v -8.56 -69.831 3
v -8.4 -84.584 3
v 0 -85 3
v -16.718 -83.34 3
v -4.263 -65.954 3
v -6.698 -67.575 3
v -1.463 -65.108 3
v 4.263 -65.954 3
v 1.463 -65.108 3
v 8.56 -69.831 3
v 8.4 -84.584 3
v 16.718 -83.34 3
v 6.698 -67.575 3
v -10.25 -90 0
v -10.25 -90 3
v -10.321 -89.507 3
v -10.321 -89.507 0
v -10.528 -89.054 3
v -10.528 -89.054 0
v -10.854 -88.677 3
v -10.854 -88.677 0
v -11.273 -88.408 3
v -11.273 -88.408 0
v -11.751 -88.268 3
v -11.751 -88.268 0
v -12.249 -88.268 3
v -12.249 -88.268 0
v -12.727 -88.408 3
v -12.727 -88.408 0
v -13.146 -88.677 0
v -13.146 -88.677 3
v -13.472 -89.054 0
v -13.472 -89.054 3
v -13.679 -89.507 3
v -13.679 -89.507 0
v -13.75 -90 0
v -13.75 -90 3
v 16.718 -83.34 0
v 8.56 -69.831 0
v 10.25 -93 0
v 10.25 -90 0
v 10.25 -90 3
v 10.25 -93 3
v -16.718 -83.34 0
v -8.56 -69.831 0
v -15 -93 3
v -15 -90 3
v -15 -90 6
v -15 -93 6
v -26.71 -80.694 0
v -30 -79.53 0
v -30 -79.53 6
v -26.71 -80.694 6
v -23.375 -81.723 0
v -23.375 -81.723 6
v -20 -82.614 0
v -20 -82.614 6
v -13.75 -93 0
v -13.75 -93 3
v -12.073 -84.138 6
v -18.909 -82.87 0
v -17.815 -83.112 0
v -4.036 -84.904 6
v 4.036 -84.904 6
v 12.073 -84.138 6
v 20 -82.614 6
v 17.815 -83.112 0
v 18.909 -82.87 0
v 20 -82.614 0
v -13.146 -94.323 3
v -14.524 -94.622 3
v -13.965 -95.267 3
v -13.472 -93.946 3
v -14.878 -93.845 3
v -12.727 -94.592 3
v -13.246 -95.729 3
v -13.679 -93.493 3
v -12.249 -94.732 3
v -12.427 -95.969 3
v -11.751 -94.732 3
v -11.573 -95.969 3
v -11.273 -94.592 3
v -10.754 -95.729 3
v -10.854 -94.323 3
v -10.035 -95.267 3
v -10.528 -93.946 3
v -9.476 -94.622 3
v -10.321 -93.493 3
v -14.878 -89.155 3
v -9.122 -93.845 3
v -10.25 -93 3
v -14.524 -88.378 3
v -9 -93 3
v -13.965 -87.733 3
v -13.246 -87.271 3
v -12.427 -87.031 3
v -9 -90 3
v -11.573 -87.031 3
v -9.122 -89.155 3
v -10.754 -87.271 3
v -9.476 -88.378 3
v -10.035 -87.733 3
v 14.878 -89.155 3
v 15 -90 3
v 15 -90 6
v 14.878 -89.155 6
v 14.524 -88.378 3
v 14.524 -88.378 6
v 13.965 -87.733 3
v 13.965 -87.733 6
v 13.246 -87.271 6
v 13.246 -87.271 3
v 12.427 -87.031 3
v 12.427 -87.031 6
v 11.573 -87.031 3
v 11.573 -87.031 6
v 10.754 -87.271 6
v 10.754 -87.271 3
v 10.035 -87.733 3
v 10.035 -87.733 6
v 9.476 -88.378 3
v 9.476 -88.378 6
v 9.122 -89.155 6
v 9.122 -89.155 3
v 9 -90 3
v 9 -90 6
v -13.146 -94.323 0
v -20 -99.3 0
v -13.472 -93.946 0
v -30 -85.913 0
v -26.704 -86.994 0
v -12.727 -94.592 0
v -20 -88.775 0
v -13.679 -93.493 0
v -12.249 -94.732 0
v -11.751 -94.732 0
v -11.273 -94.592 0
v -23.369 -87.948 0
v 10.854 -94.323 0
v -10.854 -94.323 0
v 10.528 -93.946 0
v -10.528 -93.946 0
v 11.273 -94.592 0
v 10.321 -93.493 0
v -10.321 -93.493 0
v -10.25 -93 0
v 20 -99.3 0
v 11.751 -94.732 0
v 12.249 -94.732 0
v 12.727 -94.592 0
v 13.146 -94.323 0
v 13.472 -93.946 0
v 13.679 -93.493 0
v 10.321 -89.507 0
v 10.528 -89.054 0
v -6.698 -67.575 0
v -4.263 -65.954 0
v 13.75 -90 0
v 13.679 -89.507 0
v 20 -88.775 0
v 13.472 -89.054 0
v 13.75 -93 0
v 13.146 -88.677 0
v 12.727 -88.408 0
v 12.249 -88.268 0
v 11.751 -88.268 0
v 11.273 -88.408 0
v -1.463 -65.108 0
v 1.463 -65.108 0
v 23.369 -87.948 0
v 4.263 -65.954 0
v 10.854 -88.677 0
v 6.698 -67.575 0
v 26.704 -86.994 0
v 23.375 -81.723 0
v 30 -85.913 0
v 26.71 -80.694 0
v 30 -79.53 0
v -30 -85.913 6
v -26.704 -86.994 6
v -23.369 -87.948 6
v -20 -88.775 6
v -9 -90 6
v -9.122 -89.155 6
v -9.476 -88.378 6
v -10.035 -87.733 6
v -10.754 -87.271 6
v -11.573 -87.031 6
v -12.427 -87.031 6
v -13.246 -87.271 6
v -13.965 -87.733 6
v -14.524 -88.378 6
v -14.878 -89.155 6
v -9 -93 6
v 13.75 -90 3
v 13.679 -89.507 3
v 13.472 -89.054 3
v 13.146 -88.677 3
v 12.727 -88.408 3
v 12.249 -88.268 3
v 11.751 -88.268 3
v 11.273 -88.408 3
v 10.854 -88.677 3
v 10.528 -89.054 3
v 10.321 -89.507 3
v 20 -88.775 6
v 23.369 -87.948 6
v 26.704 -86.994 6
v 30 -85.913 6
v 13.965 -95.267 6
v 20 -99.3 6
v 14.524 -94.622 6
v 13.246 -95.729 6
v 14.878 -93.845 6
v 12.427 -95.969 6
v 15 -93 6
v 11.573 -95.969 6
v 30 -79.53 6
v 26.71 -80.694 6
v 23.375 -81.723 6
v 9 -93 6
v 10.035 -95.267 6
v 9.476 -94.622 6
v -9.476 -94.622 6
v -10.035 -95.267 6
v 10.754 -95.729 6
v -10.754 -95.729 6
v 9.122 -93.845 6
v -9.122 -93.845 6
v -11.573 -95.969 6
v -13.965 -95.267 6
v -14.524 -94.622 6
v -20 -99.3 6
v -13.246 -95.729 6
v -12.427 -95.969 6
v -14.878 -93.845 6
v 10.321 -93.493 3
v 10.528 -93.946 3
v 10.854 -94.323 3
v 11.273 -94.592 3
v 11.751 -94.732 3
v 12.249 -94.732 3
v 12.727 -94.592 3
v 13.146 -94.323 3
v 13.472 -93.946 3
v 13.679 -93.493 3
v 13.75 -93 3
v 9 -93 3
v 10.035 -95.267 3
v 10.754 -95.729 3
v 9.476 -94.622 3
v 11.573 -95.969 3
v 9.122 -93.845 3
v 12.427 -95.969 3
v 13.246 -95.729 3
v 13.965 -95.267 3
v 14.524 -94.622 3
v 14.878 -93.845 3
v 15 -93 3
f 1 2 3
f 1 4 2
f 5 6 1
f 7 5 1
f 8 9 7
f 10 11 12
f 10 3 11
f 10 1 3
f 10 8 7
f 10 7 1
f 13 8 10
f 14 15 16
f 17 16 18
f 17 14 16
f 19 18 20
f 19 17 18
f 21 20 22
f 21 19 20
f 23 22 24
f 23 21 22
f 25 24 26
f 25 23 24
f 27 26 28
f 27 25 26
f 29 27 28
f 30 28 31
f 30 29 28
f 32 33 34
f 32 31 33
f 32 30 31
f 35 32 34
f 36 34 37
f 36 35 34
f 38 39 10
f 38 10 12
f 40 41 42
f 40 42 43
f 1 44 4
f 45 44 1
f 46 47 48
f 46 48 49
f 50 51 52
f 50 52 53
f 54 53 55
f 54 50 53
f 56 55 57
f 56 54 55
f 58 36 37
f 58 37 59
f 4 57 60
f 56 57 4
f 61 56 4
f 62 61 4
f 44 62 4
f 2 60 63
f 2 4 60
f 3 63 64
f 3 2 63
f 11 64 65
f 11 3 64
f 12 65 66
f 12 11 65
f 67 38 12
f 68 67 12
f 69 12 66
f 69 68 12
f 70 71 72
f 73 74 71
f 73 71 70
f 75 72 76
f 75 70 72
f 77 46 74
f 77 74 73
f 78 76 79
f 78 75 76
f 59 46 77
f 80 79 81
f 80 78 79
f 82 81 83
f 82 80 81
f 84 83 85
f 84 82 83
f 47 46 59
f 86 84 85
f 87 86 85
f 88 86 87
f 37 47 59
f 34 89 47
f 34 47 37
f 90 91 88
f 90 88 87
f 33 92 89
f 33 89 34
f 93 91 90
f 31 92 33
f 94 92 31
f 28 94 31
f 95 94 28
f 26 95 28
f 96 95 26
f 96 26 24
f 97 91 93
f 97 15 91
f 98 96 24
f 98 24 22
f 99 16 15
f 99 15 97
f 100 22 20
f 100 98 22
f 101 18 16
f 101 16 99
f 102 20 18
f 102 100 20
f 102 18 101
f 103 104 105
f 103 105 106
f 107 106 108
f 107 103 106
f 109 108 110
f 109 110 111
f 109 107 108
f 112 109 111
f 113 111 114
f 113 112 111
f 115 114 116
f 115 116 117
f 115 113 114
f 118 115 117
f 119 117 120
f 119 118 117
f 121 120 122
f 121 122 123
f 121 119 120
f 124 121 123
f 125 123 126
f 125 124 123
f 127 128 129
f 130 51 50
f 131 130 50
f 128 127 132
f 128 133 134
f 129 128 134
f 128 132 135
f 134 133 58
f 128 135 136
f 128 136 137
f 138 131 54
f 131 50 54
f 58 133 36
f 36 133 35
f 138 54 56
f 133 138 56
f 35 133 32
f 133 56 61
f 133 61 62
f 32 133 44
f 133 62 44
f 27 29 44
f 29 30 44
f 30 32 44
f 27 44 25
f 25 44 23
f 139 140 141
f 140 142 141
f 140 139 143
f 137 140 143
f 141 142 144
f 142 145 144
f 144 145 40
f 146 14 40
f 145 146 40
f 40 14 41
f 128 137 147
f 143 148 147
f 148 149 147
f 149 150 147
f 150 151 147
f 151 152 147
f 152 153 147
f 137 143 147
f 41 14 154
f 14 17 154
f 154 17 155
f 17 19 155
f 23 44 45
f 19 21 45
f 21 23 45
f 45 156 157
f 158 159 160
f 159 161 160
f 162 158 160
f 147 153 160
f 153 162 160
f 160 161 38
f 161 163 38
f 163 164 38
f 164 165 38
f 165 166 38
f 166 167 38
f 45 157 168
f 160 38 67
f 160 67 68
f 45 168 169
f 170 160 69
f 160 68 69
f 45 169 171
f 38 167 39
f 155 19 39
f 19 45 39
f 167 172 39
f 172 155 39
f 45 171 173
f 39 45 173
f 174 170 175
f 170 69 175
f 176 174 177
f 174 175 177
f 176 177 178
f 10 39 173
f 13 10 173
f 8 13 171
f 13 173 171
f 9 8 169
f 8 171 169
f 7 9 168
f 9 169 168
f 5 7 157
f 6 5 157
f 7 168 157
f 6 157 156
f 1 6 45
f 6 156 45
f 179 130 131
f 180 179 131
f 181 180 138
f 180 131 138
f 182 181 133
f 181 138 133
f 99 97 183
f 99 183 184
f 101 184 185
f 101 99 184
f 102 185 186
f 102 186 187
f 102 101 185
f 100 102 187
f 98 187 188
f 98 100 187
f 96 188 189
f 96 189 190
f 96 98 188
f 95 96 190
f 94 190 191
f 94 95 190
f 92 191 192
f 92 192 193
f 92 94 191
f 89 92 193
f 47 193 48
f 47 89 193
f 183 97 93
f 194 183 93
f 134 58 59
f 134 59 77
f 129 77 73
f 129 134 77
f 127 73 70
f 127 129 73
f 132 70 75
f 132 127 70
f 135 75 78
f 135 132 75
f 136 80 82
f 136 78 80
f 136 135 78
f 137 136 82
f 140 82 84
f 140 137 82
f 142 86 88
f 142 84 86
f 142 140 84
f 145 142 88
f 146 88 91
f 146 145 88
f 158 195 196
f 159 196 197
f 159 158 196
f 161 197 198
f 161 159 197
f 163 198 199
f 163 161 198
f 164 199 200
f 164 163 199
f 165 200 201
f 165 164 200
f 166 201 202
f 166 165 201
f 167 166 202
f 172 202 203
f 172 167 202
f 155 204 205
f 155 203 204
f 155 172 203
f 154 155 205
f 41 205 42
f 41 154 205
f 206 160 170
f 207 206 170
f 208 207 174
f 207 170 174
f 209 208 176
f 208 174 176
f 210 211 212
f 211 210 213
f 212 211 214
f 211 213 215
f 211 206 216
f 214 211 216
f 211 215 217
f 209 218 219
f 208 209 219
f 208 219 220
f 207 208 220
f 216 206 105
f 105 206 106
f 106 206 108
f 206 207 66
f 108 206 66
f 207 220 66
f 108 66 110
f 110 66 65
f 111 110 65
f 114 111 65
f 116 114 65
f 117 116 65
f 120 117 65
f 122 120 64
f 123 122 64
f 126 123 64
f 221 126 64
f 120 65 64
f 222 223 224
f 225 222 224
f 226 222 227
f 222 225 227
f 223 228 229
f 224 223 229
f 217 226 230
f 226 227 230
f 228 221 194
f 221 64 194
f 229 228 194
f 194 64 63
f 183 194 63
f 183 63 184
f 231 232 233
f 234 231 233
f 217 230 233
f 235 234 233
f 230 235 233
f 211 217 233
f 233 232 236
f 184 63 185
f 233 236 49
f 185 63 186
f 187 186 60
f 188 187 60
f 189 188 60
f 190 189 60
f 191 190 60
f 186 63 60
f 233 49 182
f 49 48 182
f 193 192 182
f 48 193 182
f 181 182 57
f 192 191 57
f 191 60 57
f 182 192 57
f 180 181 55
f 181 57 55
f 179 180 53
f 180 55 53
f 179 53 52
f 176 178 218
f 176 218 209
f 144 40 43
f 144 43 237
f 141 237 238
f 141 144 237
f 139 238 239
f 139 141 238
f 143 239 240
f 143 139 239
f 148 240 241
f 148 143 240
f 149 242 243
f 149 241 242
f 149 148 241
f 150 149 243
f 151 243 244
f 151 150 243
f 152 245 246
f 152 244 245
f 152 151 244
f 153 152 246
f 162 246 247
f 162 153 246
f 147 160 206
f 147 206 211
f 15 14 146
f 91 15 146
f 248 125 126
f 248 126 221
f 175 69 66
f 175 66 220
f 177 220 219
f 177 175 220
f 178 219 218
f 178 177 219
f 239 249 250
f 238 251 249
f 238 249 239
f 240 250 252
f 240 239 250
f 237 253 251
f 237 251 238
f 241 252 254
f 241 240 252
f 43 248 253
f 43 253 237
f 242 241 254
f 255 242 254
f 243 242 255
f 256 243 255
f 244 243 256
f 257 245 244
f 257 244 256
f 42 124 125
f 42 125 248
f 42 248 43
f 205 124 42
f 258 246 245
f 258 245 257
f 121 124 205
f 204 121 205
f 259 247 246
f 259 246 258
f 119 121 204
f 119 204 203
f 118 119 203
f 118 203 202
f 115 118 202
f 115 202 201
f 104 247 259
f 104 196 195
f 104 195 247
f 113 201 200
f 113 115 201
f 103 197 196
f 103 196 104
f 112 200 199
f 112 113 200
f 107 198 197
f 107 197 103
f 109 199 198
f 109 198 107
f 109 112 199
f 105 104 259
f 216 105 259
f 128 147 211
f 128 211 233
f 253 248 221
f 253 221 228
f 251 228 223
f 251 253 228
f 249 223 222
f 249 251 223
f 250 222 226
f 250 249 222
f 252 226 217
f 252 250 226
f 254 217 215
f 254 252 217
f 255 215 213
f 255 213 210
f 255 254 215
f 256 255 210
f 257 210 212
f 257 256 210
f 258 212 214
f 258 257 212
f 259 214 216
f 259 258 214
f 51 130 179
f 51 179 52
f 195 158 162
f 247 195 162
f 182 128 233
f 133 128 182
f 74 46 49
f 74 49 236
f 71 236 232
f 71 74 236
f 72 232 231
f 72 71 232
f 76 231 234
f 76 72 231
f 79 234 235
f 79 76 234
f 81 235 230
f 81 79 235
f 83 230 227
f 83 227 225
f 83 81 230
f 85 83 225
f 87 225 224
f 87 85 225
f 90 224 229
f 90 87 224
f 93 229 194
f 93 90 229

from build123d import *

# Parameters (mm, degrees)
PAD004_DEPTH = 3
PAD_DEPTH    = 6
PAD002_DEPTH = 6
PAD003_DEPTH = 3
PAD001_DEPTH = 6


with BuildPart() as counterborehole_pad:
    # Sketch004 → Pad004 (new body)
    with BuildSketch(Plane.XY.offset(3)):
        with BuildLine():
            ThreePointArc((-15, -93.000008), (-11.999996, -96), (-9, -93))
            Line((-9, -90), (-9, -93))
            ThreePointArc((-9, -90), (-12, -87), (-15, -90.000001))
            Line((-15, -90.000001), (-15, -93.000008))
        make_face()
        with BuildLine():
            ThreePointArc((15, -90.000001), (12, -87), (9, -90))
            Line((9, -90), (9, -93))
            ThreePointArc((9, -93), (11.999996, -96), (15, -93.000008))
            Line((15, -90.000001), (15, -93.000008))
        make_face()
    extrude(amount=PAD004_DEPTH)


with BuildPart() as throughhole_pad:
    # Sketch003 → Pad (new body)
    with BuildSketch(Plane.XY):
        with BuildLine():
            ThreePointArc((-10.25, -90), (-12.000001, -88.25), (-13.75, -90.000003))
            Line((-13.75, -90.000003), (-13.75, -93))
            ThreePointArc((-13.75, -93), (-12, -94.75), (-10.25, -93))
            Line((-10.25, -90), (-10.25, -93))
        make_face()
        with BuildLine():
            ThreePointArc((13.75, -90.000003), (12.000001, -88.25), (10.25, -90))
            Line((10.25, -90), (10.25, -93))
            ThreePointArc((10.25, -93), (12, -94.75), (13.75, -93))
            Line((13.75, -90.000003), (13.75, -93))
        make_face()
    extrude(amount=PAD_DEPTH)


with BuildPart() as frame_pad:
    # Sketch002 → Pad002 (new body)
    with BuildSketch(Plane.XY):
        with BuildLine():
            ThreePointArc((-30, -79.529869), (0, -85), (30, -79.529869))
            Line((30, -79.529869), (30, -85.912746))
            ThreePointArc((-30, -85.912746), (0, -91), (30, -85.912746))
            Line((-30, -85.912746), (-30, -79.529869))
        make_face()
    extrude(amount=PAD002_DEPTH)


with BuildPart() as base_pad:
    # Sketch001 → Pad003 (new body)
    with BuildSketch(Plane.XY):
        with BuildLine():
            ThreePointArc((8.560325, -69.83078), (0, -65), (-8.560325, -69.83078))
            Line((-20, -88.774996), (-8.560325, -69.83078))
            ThreePointArc((-20, -88.774996), (0, -91), (20, -88.774996))
            Line((8.560325, -69.83078), (20, -88.774996))
        make_face()
    extrude(amount=PAD003_DEPTH)


with BuildPart() as counterborehole_cut:
    # Sketch → Pad001 (new body)
    with BuildSketch(Plane.XY):
        with BuildLine():
            ThreePointArc((-20, -82.613558), (0, -85), (20, -82.613558))
            Line((20, -82.613558), (20, -99.299958))
            Line((20, -99.299958), (-20, -99.299958))
            Line((-20, -99.299958), (-20, -82.613558))
        make_face()
    extrude(amount=PAD001_DEPTH)

    # Fusion: union Frame_Pad, Base_Pad
    add(frame_pad.part)
    add(base_pad.part)

    # Cut: cut ThroughHole_Pad
    add(throughhole_pad.part, mode=Mode.SUBTRACT)

    # Cut001: cut CounterboreHole_Pad
    add(counterborehole_pad.part, mode=Mode.SUBTRACT)


solid = counterborehole_cut.part
